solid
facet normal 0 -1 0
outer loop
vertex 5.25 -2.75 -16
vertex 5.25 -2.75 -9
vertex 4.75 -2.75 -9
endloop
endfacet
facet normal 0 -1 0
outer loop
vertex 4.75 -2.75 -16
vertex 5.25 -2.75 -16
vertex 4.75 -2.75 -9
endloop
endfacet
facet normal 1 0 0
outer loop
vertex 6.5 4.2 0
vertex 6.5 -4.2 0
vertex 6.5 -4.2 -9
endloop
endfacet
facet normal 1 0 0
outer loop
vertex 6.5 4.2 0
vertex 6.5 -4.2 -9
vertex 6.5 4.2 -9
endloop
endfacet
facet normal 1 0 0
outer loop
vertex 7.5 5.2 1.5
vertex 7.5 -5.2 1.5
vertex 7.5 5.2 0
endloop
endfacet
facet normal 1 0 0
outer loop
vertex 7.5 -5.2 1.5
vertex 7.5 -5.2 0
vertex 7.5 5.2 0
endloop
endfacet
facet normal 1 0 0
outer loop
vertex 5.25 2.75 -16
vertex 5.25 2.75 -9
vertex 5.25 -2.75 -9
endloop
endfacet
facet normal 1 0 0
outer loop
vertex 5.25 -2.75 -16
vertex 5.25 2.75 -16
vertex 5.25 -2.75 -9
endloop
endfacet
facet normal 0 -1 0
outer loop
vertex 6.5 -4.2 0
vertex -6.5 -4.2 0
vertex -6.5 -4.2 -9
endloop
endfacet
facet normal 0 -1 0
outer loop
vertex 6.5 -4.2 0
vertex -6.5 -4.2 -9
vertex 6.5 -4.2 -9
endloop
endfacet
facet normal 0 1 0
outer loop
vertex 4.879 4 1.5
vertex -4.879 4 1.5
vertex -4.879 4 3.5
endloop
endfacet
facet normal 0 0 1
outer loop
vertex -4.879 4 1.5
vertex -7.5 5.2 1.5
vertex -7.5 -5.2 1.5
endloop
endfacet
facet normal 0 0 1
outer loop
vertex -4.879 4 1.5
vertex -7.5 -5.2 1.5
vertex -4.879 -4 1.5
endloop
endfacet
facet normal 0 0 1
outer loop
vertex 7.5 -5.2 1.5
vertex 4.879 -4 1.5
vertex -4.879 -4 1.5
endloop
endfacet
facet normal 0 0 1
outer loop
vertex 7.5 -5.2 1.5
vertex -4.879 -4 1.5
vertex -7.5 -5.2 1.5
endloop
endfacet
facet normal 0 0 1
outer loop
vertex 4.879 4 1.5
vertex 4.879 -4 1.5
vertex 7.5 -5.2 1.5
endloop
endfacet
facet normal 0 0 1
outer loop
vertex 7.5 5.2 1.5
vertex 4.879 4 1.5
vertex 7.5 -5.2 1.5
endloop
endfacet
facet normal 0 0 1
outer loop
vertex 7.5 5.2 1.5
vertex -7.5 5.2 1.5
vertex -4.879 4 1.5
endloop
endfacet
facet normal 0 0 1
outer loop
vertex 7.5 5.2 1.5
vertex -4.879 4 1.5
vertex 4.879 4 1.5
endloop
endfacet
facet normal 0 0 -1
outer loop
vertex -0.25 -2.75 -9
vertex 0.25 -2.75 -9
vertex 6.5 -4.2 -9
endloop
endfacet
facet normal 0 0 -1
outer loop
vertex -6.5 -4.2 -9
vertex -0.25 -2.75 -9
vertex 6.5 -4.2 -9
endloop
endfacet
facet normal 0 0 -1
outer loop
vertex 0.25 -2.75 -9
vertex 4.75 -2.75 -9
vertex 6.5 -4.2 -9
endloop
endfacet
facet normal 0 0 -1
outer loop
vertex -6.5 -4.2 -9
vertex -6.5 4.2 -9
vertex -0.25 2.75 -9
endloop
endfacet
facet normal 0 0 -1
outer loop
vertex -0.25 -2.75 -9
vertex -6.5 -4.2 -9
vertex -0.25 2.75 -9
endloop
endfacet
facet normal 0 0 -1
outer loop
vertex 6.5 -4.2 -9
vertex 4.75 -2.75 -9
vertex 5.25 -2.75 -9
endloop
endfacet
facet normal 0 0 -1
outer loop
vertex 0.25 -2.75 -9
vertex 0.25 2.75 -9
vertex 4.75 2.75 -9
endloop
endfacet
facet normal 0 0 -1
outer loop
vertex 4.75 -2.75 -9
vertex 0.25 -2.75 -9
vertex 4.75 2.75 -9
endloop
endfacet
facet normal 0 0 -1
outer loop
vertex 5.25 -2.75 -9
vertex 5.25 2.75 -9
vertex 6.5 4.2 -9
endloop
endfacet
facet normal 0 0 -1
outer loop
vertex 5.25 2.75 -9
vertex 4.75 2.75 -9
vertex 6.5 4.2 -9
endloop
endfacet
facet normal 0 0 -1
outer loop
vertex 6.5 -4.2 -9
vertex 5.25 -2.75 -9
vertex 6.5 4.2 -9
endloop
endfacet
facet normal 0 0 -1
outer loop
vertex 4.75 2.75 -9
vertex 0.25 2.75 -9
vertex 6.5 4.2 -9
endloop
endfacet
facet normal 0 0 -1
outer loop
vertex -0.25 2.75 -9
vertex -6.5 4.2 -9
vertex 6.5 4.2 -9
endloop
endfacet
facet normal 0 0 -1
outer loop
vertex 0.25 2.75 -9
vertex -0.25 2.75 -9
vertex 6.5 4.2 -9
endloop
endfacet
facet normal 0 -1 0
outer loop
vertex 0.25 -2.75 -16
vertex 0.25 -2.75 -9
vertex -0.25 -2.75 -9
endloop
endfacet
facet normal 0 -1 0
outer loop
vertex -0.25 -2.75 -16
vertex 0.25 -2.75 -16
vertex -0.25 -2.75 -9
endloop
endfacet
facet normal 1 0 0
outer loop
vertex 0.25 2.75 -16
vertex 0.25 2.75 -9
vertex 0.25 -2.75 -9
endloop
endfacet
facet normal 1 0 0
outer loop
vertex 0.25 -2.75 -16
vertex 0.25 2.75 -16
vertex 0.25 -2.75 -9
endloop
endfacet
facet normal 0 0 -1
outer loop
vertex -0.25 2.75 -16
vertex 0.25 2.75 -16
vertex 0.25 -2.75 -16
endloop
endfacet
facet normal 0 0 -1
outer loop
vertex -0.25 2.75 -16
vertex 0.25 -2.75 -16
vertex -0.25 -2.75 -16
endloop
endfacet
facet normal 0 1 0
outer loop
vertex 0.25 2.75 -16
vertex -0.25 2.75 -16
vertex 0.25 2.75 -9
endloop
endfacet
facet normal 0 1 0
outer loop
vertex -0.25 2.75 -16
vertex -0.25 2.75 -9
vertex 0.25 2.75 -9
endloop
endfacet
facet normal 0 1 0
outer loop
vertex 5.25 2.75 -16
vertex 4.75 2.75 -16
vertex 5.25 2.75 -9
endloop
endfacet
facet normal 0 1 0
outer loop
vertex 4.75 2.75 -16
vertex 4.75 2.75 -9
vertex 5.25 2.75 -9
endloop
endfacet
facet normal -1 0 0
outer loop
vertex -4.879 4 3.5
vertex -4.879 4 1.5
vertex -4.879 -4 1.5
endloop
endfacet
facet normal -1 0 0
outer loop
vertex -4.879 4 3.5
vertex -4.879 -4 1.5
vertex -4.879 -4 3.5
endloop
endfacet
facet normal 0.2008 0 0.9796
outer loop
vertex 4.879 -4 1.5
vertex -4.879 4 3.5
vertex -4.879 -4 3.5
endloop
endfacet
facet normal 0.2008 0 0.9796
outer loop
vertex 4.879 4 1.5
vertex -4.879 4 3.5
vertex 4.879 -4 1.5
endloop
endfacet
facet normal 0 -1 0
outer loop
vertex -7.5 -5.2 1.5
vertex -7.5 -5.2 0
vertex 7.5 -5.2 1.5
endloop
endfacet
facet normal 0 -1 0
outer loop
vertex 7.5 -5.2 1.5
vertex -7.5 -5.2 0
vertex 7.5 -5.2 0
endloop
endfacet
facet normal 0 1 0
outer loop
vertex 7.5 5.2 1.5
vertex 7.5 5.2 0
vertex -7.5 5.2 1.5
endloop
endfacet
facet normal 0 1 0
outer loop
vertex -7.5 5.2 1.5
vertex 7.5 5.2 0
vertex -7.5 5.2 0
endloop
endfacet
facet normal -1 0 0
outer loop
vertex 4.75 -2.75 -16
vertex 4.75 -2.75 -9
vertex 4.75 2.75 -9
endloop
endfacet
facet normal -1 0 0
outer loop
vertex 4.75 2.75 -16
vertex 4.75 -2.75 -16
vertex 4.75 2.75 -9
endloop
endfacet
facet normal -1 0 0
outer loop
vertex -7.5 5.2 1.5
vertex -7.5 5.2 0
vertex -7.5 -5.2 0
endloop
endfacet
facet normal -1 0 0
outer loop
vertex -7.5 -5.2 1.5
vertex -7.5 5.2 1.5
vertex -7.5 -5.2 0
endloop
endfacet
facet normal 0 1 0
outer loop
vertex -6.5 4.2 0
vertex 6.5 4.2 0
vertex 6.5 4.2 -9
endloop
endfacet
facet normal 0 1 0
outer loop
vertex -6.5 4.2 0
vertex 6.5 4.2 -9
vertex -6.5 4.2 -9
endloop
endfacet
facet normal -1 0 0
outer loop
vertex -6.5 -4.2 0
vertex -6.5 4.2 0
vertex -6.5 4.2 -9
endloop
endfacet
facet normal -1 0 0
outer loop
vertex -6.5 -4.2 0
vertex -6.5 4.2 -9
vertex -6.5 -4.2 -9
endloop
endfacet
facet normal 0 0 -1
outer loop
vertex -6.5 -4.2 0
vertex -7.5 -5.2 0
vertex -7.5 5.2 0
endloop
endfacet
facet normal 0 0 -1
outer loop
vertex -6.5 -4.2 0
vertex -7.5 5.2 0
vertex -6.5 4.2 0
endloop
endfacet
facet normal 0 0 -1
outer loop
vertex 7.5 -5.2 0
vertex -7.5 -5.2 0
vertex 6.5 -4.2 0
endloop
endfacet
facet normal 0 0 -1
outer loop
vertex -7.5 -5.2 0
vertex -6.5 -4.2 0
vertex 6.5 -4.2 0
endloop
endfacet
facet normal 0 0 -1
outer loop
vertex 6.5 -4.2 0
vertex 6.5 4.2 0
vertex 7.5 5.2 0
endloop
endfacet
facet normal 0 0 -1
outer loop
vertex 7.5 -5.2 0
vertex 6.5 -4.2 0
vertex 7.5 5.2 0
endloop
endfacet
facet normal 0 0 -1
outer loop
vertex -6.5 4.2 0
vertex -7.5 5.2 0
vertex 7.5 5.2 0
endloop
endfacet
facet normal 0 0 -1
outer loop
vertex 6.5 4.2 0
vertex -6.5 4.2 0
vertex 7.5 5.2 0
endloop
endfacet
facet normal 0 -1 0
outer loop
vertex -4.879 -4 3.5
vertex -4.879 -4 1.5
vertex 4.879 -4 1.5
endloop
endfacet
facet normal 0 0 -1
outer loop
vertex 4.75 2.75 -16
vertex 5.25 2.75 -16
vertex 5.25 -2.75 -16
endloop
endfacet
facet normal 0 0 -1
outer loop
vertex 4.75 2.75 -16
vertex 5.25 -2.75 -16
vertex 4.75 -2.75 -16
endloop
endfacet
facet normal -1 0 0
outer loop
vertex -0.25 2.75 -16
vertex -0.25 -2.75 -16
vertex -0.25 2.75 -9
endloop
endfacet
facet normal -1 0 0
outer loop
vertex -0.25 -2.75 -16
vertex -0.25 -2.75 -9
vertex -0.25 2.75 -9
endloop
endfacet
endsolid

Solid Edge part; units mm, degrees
sketch "Sketch1" plane through (0, 0, 0) normal (0, 0, 1) x (1, 0, 0)
  line L0 (7.5, -5.2) -> (7.5, 5.2)
  line L1 (7.5, 5.2) -> (-7.5, 5.2)
  line L2 (-7.5, 5.2) -> (-7.5, -5.2)
  line L3 (-7.5, -5.2) -> (7.5, -5.2)
extrude "Protrusion1" add sketch "Sketch1" along normal blind 1.5
sketch "Sketch2" plane through (0, 0, 0) normal (0, 0, 1) x (1, 0, 0)
  line L0 (6.5, 4.2) -> (-6.5, 4.2)
  line L1 (-6.5, 4.2) -> (-6.5, -4.2)
  line L2 (-6.5, -4.2) -> (6.5, -4.2)
  line L3 (6.5, -4.2) -> (6.5, 4.2)
extrude "ExtrudedProtrusion_2" add sketch "Sketch2" against normal blind 9
sketch "Sketch3" plane through (0, 0, -9) normal (0, 0, -1) x (1, 0, 0)
  line L0 (-0.25, 2.75) -> (-0.25, -2.75)
  line L1 (-0.25, -2.75) -> (0.25, -2.75)
  line L2 (0.25, -2.75) -> (0.25, 2.75)
  line L3 (0.25, 2.75) -> (-0.25, 2.75)
  line L4 (5.25, -2.75) -> (5.25, 2.75)
  line L5 (5.25, 2.75) -> (4.75, 2.75)
  line L6 (4.75, 2.75) -> (4.75, -2.75)
  line L7 (4.75, -2.75) -> (5.25, -2.75)
  dimension "D1" = 5.5
  dimension "D2" = 0.5
  dimension "D3" = 4.5
extrude "ExtrudedProtrusion_3" add sketch "Sketch3" along normal blind 7
sketch "Sketch4" plane through (0, 0, 0) normal (0, -1, 0) x (1, 0, 0)
  line L0 (-4.8786, 3.5) -> (4.8786, 1.5)
  line L1 (4.8786, 1.5) -> (-4.8786, 1.5)
  line L2 (-4.8786, 1.5) -> (-4.8786, 3.5)
extrude "ExtrudedProtrusion_4" add sketch "Sketch4" along normal mid plane 8
properties material "Graphite"
